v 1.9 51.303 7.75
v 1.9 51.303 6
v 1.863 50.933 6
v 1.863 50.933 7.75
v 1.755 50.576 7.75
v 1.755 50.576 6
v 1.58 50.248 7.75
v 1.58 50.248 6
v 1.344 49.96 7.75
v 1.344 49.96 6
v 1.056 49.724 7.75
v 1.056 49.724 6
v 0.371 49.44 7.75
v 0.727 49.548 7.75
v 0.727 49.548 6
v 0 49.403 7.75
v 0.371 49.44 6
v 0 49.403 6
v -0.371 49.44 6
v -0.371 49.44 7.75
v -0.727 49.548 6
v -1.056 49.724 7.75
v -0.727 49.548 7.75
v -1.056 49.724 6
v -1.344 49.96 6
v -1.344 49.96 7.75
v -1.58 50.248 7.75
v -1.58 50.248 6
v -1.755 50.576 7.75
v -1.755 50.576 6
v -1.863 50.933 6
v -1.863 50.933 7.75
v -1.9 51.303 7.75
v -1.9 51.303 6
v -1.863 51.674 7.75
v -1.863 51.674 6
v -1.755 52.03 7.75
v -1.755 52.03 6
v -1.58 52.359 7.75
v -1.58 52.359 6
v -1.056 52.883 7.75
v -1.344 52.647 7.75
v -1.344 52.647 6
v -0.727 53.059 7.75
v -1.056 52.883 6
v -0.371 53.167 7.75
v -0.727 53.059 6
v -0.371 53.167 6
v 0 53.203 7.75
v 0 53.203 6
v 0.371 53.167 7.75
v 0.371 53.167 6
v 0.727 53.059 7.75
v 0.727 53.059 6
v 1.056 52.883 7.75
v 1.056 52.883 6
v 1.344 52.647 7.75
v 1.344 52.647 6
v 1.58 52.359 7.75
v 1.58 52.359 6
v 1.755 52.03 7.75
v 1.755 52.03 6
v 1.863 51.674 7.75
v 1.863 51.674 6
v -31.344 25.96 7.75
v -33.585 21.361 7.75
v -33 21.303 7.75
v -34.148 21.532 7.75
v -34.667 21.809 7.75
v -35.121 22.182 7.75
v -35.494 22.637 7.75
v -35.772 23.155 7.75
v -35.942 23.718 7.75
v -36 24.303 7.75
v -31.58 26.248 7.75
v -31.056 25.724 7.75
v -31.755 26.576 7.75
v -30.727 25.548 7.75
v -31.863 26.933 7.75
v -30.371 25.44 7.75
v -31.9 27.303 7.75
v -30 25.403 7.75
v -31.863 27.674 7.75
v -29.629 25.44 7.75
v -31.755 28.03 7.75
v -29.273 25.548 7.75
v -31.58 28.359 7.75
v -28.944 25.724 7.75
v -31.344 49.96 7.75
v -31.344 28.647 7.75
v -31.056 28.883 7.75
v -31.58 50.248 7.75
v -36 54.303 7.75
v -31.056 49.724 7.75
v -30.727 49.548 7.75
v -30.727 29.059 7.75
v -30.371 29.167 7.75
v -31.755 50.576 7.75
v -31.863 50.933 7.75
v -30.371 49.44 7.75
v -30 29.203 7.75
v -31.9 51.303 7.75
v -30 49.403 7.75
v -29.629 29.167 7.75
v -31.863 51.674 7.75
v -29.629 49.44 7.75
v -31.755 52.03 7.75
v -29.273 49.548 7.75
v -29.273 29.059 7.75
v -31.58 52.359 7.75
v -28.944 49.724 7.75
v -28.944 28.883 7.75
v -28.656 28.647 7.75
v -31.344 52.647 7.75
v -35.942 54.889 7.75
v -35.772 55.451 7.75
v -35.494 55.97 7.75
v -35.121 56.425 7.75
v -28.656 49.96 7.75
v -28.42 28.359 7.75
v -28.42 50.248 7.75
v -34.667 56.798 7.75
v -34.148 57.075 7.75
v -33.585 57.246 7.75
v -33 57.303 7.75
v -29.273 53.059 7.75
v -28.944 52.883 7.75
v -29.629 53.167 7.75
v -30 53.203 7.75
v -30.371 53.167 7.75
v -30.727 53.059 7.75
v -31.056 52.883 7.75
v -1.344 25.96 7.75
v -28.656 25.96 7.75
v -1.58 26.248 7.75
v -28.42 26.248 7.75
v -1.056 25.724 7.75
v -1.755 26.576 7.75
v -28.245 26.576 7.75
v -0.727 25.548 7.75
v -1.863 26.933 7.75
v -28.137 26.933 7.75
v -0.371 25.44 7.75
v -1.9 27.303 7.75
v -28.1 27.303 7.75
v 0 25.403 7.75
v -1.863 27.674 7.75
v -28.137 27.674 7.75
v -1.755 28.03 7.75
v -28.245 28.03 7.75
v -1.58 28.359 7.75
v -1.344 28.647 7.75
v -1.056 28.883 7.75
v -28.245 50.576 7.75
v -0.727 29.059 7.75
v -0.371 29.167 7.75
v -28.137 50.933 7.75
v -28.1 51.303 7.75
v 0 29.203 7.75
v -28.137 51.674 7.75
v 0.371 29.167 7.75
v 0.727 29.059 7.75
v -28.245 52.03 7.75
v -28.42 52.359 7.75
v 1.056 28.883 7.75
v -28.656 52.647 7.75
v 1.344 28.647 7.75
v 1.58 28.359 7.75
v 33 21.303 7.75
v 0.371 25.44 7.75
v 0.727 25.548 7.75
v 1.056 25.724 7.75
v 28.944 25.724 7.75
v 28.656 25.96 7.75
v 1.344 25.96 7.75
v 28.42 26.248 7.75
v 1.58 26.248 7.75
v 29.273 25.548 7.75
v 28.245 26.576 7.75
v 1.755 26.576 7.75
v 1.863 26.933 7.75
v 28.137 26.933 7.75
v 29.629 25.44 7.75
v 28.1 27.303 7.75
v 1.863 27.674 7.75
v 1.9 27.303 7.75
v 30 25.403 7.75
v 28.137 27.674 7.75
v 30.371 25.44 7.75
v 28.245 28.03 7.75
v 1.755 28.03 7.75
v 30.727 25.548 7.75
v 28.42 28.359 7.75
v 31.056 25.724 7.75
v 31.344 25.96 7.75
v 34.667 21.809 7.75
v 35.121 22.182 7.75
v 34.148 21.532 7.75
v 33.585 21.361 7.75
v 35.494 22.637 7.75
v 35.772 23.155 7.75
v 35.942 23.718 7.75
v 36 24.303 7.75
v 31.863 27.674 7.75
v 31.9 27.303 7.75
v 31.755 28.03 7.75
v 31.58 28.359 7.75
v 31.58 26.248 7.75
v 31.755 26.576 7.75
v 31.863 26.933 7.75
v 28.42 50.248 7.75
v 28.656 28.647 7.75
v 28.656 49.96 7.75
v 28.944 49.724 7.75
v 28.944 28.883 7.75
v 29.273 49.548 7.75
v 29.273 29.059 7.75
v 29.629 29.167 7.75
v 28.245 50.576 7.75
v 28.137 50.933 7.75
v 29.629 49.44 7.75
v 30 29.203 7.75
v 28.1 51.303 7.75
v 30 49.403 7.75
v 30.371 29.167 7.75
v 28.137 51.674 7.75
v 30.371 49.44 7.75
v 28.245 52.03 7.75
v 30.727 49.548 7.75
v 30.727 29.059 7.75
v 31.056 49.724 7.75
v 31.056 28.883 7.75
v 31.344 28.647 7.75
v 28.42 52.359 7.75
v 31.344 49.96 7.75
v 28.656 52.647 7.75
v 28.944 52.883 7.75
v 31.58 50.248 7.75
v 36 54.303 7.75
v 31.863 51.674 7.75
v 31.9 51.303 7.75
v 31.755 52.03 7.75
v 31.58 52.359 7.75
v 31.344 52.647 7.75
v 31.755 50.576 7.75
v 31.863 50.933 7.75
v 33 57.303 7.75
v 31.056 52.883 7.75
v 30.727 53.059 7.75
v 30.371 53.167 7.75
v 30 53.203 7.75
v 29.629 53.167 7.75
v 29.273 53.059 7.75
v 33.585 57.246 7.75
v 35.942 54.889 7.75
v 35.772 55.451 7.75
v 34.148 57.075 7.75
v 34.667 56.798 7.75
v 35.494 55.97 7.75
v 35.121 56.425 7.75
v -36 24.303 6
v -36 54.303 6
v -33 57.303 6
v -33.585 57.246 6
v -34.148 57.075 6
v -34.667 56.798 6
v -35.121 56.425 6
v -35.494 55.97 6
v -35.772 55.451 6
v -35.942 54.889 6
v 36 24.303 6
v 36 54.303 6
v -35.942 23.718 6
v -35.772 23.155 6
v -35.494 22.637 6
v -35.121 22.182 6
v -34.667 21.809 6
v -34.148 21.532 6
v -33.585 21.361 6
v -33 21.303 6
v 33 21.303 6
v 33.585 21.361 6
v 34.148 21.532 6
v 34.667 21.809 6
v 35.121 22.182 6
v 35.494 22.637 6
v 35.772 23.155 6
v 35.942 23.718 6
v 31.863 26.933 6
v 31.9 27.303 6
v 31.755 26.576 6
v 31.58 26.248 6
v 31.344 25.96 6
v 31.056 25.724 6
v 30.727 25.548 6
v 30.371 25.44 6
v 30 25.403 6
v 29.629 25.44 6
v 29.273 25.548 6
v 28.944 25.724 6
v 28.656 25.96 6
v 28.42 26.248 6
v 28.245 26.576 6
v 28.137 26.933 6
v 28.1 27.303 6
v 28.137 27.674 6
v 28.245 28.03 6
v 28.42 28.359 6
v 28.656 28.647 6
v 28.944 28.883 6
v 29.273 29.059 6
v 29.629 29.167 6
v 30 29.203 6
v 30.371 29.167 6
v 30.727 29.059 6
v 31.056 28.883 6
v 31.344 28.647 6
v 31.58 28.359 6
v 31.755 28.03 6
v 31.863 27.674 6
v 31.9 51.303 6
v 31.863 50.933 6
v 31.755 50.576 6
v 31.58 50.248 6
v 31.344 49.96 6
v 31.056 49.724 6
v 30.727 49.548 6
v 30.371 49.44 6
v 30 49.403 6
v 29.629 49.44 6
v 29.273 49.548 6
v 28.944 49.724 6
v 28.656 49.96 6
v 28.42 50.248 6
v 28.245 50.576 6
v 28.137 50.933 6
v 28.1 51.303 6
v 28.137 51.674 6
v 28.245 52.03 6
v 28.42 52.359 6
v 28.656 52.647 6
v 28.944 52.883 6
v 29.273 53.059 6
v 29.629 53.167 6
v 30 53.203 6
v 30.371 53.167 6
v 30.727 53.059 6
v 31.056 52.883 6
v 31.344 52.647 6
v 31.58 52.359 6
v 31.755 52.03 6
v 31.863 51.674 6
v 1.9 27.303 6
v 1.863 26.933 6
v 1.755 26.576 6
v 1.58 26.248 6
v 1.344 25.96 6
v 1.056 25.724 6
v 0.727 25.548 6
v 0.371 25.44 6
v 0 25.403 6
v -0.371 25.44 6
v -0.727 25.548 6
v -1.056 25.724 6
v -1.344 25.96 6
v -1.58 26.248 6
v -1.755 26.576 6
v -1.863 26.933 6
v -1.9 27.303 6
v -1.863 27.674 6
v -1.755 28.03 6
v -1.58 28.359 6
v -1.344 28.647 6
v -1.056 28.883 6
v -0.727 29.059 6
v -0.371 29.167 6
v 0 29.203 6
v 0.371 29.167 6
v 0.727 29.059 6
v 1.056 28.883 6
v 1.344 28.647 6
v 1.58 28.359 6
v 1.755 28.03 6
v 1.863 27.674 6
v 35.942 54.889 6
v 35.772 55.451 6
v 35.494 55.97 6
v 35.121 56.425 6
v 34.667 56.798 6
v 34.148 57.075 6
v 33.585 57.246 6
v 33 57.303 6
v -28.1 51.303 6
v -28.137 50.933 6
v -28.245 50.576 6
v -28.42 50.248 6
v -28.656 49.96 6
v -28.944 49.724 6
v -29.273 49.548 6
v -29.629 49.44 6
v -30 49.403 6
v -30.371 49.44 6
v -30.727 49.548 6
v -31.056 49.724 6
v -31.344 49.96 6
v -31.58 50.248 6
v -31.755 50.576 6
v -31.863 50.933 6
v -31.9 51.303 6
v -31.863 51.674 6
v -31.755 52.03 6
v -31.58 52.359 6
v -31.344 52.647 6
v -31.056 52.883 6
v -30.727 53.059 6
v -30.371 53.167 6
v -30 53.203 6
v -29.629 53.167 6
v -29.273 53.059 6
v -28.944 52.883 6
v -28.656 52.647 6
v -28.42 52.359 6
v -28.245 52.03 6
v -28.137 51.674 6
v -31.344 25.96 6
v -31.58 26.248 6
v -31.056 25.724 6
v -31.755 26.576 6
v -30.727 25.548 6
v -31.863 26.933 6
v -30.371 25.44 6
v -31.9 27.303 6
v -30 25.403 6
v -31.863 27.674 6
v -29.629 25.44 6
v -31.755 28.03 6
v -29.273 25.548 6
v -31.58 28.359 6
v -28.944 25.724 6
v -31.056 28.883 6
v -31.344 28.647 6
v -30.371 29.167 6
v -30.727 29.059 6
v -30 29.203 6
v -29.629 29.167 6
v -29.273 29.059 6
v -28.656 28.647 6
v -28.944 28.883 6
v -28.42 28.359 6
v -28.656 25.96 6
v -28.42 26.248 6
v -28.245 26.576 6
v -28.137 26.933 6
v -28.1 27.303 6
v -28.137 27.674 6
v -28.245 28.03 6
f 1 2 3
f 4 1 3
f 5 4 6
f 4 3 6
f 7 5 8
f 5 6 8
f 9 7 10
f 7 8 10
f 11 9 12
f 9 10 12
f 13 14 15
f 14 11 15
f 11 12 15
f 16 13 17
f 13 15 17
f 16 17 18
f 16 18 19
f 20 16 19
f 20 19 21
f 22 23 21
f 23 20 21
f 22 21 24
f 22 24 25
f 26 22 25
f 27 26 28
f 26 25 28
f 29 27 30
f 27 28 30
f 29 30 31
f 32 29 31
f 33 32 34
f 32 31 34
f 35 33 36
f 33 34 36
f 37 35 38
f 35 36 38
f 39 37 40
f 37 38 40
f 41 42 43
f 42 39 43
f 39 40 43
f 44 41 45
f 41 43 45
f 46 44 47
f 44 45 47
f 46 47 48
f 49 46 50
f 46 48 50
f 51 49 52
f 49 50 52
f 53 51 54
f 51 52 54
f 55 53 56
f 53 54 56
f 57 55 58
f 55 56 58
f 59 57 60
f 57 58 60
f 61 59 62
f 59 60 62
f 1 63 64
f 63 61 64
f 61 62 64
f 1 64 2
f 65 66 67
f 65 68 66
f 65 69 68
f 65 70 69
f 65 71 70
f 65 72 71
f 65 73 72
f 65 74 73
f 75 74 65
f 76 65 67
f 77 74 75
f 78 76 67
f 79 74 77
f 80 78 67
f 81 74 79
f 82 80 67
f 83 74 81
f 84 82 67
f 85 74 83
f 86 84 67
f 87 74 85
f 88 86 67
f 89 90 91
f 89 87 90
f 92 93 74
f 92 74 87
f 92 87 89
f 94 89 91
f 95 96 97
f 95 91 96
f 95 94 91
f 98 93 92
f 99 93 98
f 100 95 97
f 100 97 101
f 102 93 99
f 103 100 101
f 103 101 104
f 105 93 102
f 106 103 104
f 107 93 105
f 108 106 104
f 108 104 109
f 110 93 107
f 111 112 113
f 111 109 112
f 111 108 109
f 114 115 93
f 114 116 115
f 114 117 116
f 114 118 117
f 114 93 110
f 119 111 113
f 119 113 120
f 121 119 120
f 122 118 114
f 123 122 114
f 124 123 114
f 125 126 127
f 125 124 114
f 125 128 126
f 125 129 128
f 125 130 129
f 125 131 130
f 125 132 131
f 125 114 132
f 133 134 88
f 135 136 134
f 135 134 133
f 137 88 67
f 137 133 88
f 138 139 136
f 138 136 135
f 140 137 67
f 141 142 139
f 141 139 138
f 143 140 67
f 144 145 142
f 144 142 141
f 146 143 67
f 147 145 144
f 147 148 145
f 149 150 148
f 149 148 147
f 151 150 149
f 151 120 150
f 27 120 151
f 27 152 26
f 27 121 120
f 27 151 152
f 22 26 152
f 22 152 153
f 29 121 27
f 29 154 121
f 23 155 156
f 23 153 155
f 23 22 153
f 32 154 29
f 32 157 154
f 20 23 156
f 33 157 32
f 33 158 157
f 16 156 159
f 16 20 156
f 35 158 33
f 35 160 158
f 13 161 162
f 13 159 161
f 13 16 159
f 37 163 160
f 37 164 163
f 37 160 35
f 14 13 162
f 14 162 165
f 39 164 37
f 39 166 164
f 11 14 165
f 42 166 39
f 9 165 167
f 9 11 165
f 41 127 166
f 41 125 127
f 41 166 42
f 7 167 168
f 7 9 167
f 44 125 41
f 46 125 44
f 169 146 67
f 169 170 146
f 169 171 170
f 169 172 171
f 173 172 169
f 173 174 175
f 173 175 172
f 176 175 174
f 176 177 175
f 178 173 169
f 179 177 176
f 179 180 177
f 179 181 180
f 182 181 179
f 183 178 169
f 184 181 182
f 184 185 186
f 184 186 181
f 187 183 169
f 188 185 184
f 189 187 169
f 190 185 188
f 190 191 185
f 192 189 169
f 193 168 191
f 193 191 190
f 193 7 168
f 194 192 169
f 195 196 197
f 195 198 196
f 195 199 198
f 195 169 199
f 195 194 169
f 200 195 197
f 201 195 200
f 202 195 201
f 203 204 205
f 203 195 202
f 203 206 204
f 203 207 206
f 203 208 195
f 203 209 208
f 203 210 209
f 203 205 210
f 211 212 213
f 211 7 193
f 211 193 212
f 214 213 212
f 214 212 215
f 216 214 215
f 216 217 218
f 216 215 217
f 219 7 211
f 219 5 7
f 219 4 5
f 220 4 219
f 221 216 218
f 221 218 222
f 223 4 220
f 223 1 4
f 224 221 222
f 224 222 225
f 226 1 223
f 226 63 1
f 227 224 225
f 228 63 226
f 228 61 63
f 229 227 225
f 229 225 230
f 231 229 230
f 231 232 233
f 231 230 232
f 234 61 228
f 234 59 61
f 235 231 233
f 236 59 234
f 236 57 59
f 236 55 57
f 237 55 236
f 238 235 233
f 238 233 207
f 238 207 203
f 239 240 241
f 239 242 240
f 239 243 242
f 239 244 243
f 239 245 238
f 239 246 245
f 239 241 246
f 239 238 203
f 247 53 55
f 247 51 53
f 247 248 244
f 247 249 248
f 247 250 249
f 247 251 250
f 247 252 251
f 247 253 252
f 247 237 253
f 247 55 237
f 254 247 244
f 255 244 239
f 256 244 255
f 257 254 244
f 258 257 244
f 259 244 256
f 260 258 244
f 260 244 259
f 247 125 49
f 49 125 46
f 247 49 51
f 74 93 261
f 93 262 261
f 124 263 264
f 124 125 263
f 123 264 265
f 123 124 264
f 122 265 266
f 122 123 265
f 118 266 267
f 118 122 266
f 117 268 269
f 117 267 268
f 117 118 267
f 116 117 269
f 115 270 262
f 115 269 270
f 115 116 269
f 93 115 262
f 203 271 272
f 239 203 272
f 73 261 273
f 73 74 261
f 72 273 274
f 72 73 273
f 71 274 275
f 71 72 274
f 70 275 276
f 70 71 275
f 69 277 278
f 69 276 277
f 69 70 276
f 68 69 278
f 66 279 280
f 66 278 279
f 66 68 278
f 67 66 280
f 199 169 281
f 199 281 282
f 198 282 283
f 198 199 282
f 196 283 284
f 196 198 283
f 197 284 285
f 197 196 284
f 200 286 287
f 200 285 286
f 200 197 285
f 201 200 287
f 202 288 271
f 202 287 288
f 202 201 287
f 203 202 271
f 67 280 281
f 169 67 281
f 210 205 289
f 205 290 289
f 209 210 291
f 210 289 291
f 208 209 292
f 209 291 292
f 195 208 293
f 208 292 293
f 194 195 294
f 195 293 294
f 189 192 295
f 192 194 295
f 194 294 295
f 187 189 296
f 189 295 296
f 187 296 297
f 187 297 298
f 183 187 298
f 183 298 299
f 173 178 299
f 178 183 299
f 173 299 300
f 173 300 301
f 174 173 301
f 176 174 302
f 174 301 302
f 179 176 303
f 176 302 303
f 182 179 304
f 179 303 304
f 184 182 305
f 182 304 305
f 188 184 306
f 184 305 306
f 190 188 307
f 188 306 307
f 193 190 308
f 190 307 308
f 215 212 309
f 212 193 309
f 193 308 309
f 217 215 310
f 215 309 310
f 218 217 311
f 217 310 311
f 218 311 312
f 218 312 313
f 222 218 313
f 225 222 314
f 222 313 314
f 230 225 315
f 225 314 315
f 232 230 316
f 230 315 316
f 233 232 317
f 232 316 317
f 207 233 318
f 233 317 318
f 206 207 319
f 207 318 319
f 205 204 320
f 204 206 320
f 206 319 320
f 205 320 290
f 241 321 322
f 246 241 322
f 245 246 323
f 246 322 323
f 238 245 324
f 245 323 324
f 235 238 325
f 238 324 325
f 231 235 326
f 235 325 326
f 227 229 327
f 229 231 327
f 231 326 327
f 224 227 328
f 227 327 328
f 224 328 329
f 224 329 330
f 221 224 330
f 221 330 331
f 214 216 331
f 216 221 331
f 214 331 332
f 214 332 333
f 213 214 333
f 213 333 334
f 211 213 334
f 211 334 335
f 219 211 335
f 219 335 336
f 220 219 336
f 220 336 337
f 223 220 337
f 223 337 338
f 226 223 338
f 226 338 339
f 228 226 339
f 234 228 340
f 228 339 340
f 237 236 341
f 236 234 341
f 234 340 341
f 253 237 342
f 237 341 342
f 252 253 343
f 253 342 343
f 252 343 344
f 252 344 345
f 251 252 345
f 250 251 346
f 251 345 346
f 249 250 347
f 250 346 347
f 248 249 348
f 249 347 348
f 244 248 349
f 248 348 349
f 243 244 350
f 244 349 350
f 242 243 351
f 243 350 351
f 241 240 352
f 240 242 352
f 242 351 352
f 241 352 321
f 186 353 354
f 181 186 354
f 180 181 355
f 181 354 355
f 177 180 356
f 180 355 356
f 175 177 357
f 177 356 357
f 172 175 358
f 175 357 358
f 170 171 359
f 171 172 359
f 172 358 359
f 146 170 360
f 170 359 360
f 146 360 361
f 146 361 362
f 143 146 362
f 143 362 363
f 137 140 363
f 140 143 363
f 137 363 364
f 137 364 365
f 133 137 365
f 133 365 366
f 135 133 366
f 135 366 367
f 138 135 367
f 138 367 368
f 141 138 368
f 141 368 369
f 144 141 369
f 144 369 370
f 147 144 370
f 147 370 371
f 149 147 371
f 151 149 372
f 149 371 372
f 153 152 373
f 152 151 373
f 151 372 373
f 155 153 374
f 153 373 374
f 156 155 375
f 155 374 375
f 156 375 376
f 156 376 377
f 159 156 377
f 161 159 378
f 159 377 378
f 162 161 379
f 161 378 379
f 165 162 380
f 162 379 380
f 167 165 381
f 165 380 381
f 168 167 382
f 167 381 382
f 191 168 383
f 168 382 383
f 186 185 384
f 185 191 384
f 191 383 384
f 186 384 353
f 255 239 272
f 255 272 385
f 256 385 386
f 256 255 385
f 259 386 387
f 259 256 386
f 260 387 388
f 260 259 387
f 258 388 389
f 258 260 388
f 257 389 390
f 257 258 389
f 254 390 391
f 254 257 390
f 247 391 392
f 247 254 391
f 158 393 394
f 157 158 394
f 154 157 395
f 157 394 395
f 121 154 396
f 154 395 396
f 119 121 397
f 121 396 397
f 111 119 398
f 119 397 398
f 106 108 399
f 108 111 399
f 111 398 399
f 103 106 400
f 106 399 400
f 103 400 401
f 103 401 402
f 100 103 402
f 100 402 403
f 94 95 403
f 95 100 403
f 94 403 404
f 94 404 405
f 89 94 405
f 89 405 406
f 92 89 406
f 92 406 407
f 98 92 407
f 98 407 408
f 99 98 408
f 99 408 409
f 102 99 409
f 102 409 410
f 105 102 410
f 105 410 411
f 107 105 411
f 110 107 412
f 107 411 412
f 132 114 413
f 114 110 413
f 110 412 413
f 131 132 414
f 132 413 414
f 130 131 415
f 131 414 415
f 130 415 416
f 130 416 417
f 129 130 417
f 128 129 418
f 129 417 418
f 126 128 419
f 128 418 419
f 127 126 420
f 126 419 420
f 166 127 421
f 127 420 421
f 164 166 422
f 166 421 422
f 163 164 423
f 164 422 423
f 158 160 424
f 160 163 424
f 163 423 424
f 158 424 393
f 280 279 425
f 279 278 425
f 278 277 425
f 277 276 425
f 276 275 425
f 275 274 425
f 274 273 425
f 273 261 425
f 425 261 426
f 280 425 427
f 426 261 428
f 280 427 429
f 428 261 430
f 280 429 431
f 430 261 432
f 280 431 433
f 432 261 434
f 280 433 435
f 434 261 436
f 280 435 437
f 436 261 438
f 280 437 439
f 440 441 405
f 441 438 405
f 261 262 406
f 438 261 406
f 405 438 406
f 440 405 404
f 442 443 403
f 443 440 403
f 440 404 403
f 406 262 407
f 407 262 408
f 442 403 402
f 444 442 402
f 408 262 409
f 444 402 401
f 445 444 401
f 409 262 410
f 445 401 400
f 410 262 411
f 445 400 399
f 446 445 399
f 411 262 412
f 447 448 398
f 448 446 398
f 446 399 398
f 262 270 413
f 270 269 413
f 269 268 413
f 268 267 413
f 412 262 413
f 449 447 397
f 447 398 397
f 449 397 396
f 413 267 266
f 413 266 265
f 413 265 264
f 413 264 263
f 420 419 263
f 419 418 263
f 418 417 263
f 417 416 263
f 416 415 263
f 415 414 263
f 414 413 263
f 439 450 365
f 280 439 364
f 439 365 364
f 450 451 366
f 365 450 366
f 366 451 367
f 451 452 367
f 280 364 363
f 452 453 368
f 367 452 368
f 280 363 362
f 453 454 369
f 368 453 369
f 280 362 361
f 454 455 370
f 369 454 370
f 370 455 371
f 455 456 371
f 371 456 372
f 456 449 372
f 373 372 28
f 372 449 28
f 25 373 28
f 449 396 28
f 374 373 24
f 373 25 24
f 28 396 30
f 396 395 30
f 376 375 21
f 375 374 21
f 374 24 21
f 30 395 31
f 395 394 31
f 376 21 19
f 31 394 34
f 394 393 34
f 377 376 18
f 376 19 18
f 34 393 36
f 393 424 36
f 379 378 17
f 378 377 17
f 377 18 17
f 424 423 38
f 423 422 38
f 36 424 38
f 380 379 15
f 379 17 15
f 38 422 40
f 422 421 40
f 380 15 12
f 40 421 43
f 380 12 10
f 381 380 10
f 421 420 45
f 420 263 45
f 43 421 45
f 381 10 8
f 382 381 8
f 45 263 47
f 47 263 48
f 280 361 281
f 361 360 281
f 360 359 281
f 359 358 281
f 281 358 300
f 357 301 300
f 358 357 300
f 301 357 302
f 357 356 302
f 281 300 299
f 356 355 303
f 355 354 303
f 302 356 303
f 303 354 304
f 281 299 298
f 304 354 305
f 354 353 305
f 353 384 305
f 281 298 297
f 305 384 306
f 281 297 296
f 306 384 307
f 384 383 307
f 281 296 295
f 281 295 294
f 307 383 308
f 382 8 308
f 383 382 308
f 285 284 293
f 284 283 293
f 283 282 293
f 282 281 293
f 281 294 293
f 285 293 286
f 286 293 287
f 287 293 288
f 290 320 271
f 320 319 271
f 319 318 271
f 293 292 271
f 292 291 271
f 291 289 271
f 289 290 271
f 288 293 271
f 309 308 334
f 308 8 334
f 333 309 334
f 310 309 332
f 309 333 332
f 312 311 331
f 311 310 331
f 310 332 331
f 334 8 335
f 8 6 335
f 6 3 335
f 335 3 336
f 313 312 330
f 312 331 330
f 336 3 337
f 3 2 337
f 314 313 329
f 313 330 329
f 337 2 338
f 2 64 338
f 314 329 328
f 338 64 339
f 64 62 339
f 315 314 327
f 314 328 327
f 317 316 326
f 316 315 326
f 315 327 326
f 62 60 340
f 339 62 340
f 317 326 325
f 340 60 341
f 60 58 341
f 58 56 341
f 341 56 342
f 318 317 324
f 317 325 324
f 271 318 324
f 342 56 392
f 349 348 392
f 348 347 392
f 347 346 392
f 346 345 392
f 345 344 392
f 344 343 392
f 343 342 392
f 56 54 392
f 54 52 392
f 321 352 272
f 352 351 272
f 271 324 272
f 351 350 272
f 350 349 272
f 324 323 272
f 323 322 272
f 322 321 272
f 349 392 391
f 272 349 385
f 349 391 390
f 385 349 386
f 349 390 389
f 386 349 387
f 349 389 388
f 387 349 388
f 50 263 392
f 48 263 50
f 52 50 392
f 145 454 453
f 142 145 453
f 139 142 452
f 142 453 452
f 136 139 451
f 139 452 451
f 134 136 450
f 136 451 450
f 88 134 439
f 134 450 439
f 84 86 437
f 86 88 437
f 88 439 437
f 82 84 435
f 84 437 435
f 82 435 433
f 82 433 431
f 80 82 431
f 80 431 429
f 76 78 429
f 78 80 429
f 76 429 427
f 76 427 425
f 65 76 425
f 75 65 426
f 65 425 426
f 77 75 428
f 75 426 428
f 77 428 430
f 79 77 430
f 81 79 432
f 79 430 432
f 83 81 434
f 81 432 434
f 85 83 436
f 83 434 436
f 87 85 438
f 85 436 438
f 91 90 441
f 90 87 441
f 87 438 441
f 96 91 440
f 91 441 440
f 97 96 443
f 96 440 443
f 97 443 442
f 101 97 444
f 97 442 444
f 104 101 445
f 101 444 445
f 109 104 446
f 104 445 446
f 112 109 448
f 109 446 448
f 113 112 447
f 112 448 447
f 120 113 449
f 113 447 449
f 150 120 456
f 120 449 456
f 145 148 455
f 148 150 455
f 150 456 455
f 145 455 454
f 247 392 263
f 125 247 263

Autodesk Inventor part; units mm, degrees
ref_plane "YZ Plane" through (0, 0, 0) normal (1, 0, 0) x (0, 1, 0)
ref_plane "XZ Plane" through (0, 0, 0) normal (0, 1, 0) x (-1, 0, 0)
ref_plane "XY Plane" through (0, 0, 0) normal (0, 0, 1) x (1, 0, 0)
ref_plane "Work Plane1" through (0, 0, 6) normal (0, 0, 1) x (1, 0, 0)
sketch "Sketch2" plane through (0, 0, 6) normal (0, 0, 1) x (1, 0, 0)
  circle A0 centre (30, 51.3034) radius 1.5 construction
  circle A1 centre (30, 27.3034) radius 1.5 construction
  circle A2 centre (0, 51.3034) radius 1.5 construction
  circle A3 centre (0, 27.3034) radius 1.5 construction
  circle A4 centre (-30, 51.3034) radius 1.5 construction
  circle A5 centre (-30, 27.3034) radius 1.5 construction
  line L0 (36, 57.3034) -> (-36, 57.3034)
  line L1 (-36, 57.3034) -> (-36, 21.3034)
  line L2 (-36, 21.3034) -> (36, 21.3034)
  line L3 (36, 21.3034) -> (36, 57.3034)
  circle A6 centre (30, 51.3034) radius 1.9
  circle A7 centre (30, 27.3034) radius 1.9
  circle A8 centre (0, 51.3034) radius 1.9
  circle A9 centre (0, 27.3034) radius 1.9
  circle A10 centre (-30, 51.3034) radius 1.9
  circle A11 centre (-30, 27.3034) radius 1.9
  point P0 (0, 0)
  dimension "d0" = 6
  dimension "d1" = 6
  dimension "d2" = 6
  dimension "d3" = 6
  dimension "d4" = 0.4
  dimension "d5" = 0.4
  dimension "d6" = 0.4
  dimension "d7" = 0.4
  dimension "d8" = 0.4
  dimension "d9" = 0.4
extrude "Extrusion1" add sketch "Sketch2" along normal blind 1.75
fillet "Fillet1" radius 3 4 edges at (-36, 57.3034, 6.875) (-36, 21.3034, 6.875) (36, 57.3034, 6.875) (36, 21.3034, 6.875)
properties part number "Board"
